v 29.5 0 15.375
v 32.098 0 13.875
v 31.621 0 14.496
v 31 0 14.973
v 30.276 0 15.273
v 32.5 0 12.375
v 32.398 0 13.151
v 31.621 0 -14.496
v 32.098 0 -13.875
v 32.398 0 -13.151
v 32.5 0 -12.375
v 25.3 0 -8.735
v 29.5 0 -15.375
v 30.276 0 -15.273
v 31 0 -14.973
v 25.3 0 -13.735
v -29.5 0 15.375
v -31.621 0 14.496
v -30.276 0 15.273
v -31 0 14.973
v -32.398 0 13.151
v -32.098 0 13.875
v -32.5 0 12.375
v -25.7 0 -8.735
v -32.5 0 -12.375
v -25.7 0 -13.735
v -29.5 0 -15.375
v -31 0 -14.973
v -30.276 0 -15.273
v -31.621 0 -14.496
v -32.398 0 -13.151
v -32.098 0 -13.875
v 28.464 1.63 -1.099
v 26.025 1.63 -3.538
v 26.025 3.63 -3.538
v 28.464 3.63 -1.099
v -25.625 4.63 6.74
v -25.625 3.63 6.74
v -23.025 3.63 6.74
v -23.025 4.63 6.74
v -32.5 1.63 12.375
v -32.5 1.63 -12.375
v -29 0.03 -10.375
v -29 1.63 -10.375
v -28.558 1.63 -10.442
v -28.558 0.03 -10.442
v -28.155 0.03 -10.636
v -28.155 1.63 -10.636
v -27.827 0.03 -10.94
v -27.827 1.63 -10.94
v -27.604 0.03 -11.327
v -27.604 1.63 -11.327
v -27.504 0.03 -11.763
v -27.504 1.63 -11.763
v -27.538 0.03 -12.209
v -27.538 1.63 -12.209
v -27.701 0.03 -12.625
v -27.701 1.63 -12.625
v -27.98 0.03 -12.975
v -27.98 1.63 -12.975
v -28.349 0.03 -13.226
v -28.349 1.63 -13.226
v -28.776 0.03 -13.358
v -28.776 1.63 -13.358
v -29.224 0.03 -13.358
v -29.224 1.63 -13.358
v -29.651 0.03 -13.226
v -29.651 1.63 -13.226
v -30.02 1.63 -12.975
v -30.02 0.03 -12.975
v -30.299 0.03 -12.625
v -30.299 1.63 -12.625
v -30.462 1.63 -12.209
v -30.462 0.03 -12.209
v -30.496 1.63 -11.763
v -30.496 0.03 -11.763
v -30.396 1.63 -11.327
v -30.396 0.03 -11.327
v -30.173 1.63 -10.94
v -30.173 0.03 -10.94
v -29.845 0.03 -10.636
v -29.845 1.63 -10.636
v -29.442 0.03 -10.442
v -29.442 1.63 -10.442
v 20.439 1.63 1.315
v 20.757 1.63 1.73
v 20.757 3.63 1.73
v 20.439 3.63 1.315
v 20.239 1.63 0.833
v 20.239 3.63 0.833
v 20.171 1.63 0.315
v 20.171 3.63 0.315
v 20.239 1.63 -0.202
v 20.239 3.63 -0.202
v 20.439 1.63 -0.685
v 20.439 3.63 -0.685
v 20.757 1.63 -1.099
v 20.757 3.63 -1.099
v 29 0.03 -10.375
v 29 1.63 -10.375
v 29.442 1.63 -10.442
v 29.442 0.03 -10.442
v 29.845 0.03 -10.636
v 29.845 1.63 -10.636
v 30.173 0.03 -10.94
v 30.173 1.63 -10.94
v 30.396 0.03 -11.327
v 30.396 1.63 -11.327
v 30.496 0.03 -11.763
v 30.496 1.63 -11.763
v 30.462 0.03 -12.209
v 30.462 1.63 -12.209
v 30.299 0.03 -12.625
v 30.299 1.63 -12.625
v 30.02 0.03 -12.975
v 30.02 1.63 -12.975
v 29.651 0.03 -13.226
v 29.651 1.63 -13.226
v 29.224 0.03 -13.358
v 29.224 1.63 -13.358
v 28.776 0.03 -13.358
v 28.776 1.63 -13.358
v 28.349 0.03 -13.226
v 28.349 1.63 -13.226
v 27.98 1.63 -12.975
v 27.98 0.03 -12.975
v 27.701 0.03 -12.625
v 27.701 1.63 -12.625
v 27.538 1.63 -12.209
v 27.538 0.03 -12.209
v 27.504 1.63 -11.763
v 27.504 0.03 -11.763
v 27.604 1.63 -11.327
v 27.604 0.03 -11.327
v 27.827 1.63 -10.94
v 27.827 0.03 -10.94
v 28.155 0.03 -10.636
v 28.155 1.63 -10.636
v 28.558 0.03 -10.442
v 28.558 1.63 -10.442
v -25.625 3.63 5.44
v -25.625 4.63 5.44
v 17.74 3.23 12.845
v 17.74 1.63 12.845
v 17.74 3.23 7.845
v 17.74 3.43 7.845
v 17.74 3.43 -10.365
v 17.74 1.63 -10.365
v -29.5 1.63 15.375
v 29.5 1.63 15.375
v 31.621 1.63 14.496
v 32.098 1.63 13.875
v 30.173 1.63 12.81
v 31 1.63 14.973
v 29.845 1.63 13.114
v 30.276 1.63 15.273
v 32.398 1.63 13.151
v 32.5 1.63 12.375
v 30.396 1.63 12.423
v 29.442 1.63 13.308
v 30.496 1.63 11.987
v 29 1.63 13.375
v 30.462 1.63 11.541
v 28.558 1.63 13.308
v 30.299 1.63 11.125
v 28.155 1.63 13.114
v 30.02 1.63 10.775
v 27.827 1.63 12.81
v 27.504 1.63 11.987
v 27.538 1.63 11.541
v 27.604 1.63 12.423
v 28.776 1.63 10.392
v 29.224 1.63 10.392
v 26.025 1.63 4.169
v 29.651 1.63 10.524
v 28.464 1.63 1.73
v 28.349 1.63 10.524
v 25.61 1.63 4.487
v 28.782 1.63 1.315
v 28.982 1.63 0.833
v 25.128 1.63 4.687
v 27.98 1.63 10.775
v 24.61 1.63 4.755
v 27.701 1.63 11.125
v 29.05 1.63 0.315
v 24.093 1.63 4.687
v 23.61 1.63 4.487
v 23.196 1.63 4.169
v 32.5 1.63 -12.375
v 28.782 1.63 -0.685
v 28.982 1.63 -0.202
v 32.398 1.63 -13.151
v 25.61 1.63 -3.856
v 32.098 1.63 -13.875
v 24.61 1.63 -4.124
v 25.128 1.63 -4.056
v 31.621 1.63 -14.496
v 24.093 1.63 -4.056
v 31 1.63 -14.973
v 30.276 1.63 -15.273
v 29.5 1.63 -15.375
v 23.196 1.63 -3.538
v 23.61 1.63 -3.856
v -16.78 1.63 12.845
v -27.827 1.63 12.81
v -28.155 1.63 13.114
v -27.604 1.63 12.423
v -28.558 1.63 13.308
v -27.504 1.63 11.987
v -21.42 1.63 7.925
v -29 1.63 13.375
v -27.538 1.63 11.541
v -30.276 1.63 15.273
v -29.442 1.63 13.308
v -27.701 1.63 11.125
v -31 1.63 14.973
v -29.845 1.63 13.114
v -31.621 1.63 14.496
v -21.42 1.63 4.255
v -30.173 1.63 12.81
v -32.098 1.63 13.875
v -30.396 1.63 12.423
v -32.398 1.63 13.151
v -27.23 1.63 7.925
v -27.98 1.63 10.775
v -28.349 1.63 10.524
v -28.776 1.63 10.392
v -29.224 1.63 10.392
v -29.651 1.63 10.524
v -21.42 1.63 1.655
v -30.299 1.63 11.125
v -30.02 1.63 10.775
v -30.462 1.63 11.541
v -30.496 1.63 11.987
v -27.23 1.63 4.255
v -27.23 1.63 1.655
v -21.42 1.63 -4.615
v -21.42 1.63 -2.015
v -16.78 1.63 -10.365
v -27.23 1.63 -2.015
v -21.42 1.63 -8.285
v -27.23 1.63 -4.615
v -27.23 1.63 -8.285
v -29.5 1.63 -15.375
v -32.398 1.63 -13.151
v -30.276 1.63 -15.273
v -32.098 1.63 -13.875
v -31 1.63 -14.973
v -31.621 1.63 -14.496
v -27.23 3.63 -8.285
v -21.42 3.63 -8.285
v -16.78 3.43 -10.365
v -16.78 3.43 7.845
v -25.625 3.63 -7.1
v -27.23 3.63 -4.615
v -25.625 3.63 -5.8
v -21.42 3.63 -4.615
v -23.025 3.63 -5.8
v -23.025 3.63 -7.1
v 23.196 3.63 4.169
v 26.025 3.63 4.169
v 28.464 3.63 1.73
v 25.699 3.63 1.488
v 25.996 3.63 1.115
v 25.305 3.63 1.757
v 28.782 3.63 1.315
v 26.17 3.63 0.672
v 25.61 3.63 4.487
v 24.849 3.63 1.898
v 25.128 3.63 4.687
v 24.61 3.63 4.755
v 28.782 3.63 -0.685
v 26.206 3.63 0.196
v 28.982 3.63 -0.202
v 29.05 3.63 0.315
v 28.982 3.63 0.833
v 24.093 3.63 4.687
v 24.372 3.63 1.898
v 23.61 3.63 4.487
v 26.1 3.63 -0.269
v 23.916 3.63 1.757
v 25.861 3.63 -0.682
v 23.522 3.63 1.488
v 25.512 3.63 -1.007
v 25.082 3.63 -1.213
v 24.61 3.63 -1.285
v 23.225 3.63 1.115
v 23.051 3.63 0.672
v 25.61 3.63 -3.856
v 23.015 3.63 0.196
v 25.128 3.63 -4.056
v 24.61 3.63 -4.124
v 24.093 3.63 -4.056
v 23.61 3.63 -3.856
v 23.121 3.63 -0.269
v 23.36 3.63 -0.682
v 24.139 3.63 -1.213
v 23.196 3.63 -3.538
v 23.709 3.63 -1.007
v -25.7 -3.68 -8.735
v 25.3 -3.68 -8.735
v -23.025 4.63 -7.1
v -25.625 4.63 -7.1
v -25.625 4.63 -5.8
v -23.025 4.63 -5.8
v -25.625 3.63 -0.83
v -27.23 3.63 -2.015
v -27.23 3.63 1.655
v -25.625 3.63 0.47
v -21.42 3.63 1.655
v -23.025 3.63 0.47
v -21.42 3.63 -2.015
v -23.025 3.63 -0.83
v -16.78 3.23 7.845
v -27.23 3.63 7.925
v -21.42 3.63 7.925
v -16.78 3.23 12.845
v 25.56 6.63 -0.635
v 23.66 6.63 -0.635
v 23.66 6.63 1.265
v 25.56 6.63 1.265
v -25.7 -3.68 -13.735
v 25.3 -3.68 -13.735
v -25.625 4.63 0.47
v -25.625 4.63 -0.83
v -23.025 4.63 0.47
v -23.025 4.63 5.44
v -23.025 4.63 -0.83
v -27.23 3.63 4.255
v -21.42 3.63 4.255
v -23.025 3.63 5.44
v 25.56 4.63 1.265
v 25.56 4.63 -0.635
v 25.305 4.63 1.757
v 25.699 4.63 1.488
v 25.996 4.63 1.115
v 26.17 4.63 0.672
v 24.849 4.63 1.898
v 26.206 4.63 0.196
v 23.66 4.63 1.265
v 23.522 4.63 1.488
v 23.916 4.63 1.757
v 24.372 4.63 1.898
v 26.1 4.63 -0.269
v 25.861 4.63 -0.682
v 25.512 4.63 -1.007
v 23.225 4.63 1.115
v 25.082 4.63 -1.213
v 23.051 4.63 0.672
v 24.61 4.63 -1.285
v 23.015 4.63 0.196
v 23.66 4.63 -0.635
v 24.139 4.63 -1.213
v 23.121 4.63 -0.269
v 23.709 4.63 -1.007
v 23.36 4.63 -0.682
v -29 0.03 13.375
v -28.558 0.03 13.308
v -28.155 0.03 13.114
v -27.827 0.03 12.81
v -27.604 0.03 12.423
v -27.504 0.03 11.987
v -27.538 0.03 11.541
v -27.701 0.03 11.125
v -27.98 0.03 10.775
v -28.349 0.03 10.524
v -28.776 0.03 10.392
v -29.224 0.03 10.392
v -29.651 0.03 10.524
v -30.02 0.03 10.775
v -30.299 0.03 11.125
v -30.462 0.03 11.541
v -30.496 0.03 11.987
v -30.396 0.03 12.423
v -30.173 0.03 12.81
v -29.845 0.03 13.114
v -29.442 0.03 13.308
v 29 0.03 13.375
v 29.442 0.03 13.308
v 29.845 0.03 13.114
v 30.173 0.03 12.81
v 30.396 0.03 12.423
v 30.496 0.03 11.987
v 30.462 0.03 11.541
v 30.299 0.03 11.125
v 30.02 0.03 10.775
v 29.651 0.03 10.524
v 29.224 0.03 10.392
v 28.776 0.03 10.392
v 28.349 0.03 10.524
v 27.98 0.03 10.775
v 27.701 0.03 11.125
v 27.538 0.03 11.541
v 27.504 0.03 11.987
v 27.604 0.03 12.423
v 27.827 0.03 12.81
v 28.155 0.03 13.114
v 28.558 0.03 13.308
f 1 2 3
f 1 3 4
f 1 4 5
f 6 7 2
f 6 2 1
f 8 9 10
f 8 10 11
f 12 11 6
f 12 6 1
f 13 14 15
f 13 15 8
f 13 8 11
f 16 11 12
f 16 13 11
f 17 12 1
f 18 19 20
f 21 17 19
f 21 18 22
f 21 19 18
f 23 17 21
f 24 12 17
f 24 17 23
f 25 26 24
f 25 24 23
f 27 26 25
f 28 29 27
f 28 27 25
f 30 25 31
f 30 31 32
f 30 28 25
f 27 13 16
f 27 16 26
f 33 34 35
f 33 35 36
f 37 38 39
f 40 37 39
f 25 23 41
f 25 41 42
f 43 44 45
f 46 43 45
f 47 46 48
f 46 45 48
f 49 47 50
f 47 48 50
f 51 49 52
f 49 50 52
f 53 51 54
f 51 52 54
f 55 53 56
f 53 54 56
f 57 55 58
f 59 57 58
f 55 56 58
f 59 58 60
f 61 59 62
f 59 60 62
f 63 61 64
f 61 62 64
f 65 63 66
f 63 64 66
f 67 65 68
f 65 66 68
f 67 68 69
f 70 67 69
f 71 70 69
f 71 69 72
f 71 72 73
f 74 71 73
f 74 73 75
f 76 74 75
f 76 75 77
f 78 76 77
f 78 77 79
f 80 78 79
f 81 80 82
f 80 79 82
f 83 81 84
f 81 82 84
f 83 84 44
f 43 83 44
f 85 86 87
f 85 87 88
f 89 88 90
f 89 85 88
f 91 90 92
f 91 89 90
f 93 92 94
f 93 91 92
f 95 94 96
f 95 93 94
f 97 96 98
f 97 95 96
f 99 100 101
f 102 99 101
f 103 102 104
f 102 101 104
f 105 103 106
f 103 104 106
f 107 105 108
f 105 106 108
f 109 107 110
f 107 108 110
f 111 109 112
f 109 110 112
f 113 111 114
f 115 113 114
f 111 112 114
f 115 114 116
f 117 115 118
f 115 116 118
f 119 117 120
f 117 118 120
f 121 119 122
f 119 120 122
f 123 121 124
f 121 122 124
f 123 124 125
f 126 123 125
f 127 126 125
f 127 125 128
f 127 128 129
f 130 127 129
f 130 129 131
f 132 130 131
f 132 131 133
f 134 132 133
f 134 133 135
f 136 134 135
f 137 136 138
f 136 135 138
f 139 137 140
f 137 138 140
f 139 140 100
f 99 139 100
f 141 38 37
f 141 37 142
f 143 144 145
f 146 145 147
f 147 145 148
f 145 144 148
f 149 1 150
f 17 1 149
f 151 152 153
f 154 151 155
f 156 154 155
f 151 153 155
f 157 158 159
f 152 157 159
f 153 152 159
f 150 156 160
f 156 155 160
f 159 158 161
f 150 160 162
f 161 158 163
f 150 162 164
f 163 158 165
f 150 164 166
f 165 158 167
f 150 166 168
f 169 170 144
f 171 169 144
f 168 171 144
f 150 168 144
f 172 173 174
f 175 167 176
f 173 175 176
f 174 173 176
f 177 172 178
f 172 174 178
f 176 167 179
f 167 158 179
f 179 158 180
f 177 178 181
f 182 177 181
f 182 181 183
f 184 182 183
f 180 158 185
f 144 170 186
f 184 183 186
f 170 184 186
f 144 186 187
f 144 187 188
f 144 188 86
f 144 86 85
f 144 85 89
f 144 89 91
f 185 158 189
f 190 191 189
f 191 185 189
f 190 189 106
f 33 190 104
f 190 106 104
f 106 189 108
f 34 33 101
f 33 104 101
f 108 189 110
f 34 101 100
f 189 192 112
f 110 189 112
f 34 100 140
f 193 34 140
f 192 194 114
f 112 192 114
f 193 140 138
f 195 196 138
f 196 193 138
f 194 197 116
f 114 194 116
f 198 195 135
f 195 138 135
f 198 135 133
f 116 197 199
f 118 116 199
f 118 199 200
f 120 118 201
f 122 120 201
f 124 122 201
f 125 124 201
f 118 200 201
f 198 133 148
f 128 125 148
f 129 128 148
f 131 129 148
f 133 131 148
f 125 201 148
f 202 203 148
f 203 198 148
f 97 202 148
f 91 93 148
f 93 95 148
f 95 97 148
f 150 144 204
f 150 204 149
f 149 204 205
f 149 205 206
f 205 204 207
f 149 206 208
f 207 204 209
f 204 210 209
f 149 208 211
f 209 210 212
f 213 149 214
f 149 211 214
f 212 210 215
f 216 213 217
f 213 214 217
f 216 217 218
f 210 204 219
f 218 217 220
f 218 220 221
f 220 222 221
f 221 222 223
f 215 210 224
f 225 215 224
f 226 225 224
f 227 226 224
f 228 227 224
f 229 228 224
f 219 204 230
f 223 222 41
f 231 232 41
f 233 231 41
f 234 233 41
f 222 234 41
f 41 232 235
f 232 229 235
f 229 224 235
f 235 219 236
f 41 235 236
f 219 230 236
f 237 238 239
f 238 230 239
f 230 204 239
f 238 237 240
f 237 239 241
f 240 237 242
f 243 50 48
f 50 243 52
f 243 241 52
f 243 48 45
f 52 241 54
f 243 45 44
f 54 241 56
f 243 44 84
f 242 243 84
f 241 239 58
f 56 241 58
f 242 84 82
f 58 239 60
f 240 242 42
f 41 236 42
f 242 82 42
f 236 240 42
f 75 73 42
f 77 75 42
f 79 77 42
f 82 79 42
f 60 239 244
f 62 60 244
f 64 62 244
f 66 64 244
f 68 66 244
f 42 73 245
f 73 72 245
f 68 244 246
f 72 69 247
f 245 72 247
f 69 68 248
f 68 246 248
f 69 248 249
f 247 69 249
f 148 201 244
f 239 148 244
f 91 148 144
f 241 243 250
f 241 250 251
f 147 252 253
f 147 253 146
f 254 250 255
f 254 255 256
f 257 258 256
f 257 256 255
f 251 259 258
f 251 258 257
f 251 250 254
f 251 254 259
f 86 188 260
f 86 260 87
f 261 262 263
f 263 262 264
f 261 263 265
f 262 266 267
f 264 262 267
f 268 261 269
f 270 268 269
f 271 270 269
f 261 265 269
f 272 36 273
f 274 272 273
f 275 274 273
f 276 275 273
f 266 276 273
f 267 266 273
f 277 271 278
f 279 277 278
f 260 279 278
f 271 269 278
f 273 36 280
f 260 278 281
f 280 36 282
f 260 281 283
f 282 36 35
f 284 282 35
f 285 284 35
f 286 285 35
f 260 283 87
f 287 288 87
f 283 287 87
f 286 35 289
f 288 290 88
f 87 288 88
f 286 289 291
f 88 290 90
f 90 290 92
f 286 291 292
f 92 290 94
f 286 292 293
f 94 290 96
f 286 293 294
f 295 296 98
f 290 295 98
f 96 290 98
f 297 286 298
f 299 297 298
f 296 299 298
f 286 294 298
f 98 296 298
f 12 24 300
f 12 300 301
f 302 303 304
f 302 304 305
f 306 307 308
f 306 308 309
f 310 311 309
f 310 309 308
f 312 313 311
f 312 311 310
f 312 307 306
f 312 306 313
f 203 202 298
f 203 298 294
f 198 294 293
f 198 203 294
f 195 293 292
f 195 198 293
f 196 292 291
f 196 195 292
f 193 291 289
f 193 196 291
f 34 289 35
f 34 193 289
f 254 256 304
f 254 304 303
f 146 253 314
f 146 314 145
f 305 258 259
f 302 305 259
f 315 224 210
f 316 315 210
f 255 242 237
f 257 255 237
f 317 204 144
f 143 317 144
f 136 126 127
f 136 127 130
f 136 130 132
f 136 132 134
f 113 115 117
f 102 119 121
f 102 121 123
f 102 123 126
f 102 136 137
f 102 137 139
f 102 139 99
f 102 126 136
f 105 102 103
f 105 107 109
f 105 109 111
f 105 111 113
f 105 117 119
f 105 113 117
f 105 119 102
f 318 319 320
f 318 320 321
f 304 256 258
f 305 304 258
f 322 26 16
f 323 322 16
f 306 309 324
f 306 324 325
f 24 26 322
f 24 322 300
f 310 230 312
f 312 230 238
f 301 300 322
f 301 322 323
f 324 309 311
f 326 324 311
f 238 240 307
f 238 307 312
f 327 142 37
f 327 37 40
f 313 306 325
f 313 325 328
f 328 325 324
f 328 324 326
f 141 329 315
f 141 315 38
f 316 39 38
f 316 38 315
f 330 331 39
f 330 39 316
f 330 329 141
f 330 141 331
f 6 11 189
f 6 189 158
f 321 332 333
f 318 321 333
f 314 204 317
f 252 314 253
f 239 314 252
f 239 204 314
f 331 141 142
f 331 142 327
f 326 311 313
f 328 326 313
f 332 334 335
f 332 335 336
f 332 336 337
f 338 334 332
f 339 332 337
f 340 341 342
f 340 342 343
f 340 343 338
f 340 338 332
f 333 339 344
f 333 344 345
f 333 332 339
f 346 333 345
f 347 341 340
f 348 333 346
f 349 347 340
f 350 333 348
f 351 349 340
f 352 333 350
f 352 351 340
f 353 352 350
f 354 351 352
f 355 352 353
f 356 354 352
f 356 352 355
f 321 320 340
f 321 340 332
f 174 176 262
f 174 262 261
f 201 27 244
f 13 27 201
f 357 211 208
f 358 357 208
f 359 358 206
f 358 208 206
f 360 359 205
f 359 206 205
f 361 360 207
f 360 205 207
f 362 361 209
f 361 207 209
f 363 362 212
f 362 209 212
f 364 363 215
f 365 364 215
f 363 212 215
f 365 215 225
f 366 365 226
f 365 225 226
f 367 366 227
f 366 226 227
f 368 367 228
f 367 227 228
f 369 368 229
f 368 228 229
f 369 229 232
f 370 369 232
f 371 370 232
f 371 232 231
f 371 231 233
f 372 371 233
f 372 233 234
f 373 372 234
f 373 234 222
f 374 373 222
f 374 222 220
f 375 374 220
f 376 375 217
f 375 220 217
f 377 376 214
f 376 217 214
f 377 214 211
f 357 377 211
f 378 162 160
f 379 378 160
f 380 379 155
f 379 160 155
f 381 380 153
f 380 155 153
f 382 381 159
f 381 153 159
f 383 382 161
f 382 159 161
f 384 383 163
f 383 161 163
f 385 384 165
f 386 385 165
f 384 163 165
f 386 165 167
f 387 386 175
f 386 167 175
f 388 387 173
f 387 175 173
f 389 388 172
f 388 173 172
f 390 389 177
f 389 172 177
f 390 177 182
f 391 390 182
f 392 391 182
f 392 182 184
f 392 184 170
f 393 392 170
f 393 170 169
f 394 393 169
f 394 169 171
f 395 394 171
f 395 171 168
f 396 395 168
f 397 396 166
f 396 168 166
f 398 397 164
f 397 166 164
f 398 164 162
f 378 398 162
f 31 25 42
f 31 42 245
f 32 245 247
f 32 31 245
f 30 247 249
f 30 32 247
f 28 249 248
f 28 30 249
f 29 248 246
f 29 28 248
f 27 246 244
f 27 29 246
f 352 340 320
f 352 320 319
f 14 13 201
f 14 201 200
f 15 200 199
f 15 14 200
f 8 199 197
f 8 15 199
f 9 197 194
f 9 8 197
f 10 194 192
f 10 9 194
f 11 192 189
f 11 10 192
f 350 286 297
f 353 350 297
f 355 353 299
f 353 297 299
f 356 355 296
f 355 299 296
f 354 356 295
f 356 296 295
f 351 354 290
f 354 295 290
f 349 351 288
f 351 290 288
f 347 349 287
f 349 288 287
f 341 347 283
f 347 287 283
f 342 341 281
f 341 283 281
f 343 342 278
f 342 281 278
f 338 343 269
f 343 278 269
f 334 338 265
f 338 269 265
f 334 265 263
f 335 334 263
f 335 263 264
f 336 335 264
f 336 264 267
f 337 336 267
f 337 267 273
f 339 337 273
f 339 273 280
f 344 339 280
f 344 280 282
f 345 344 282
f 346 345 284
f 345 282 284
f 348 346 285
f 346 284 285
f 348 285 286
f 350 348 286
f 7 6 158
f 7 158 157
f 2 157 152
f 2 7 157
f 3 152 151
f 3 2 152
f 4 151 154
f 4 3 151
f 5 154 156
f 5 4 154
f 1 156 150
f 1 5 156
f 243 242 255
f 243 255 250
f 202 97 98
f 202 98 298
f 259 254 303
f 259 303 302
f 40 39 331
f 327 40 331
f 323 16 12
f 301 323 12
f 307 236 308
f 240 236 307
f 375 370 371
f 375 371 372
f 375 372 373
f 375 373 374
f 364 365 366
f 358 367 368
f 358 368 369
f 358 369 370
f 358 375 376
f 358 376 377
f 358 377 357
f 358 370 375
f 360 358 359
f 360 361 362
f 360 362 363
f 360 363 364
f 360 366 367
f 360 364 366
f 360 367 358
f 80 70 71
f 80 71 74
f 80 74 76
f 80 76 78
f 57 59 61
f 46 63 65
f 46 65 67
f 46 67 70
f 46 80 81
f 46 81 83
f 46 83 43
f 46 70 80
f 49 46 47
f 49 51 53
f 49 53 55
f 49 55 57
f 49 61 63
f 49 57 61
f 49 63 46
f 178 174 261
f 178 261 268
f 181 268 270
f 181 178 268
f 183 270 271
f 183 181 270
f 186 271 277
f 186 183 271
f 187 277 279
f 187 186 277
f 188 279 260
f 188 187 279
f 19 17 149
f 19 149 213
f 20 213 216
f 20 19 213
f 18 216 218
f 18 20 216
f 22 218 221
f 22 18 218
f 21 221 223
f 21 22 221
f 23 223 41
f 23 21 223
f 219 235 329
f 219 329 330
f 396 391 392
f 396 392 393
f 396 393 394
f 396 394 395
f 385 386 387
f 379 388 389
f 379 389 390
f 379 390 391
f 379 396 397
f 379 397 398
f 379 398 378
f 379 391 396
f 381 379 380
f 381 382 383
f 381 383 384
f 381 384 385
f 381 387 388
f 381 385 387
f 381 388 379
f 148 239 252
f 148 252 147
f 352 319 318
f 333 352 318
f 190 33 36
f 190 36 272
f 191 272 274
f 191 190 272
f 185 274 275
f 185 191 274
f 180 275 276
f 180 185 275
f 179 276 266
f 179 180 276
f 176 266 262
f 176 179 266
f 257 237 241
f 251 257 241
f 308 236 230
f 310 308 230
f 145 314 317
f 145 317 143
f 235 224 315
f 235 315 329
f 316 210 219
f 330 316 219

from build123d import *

# Parameters (mm, degrees)
EXTRUDE_1_DEPTH     = 1.63
SKETCH_2_R          = 1.5
CUT_EXTRUDE_1_DEPTH = 1.6
SKETCH_3_W          = 34.52
SKETCH_3_H          = 23.21
EXTRUDE_2_DEPTH     = 1.8
EXTRUDE_3_DEPTH     = 2
SKETCH_4_W          = 5.81
SKETCH_4_H          = 3.67
EXTRUDE_4_DEPTH     = 2
SKETCH_7_W          = 2.6
SKETCH_7_H          = 1.3
EXTRUDE_5_DEPTH     = 1
SKETCH_8_W          = 51
SKETCH_8_H          = 5
EXTRUDE_6_DEPTH     = 3.68
SKETCH_9_W          = 1.9
SKETCH_9_H          = 1.9
EXTRUDE_7_DEPTH     = 3
SKETCH_10_R         = 1.6
EXTRUDE_8_DEPTH     = 1
SKETCH_11_W         = 34.52
SKETCH_11_H         = 5
CUT_EXTRUDE_2_DEPTH = 0.2


with BuildPart() as part:
    # 草图1 → 凸台-拉伸1 (new body)
    with BuildSketch(Plane(origin=(0, 0, 0), x_dir=(1, 0, 0), z_dir=(0, 1, 0))):
        with BuildLine():
            Line((-29.5, 15.375), (29.5, 15.375))
            ThreePointArc((29.5, 15.375), (31.621320344, 14.496320344), (32.5, 12.375))
            Line((32.5, 12.375), (32.5, -12.375))
            ThreePointArc((32.5, -12.375), (31.621320344, -14.496320344), (29.5, -15.375))
            Line((29.5, -15.375), (-29.5, -15.375))
            ThreePointArc((-29.5, -15.375), (-31.621320344, -14.496320344), (-32.5, -12.375))
            Line((-32.5, -12.375), (-32.5, 12.375))
            ThreePointArc((-32.5, 12.375), (-31.621320344, 14.496320344), (-29.5, 15.375))
        make_face()
    extrude(amount=EXTRUDE_1_DEPTH)

    # 草图2 → 切除-拉伸1 (cut)
    with BuildSketch(Plane(origin=(0, 1.63, 0), x_dir=(1, 0, 0), z_dir=(0, 1, 0))):
        with Locations(Location((-29, 11.875, 0), (0, 0, 270))):  # turned: the seam where the file's is
            Circle(SKETCH_2_R)
        with Locations(Location((-29, -11.875, 0), (0, 0, 270))):  # turned: the seam where the file's is
            Circle(SKETCH_2_R)
        with Locations(Location((29, -11.875, 0), (0, 0, 270))):  # turned: the seam where the file's is
            Circle(SKETCH_2_R)
        with Locations(Location((29, 11.875, 0), (0, 0, 270))):  # turned: the seam where the file's is
            Circle(SKETCH_2_R)
    extrude(amount=-CUT_EXTRUDE_1_DEPTH, mode=Mode.SUBTRACT)

    # 草图3 → 凸台-拉伸2 (add)
    with BuildSketch(Plane(origin=(0, 1.63, 0), x_dir=(1, 0, 0), z_dir=(0, 1, 0))):
        with Locations((0.48, -1.24)):
            Rectangle(SKETCH_3_W, SKETCH_3_H)
    extrude(amount=EXTRUDE_2_DEPTH)

    # 草图5 → 凸台-拉伸3 (add)
    with BuildSketch(Plane(origin=(0, 1.63, 0), x_dir=(1, 0, 0), z_dir=(0, 1, 0))):
        with BuildLine():
            Line((26.024695167, 3.538250353), (28.464213562, 1.098731957))
            ThreePointArc((28.464213562, 1.098731957), (29.05, -0.315481605), (28.464213562, -1.729695167))
            Line((28.464213562, -1.729695167), (26.024695167, -4.169213562))
            ThreePointArc((26.024695167, -4.169213562), (24.610481605, -4.755), (23.196268043, -4.169213562))
            Line((23.196268043, -4.169213562), (20.756749647, -1.729695167))
            ThreePointArc((20.756749647, -1.729695167), (20.17096321, -0.315481605), (20.756749647, 1.098731957))
            Line((20.756749647, 1.098731957), (23.196268043, 3.538250353))
            ThreePointArc((23.196268043, 3.538250353), (24.610481605, 4.12403679), (26.024695167, 3.538250353))
        make_face()
    extrude(amount=EXTRUDE_3_DEPTH)

    # 草图4 → 凸台-拉伸4 (add)
    with BuildSketch(Plane(origin=(0, 1.63, 0), x_dir=(1, 0, 0), z_dir=(0, 1, 0))):
        with Locations((-24.325, 6.45)):
            Rectangle(SKETCH_4_W, SKETCH_4_H)
        with Locations((-24.325, 0.18)):
            Rectangle(SKETCH_4_W, SKETCH_4_H)
        with Locations((-24.325, -6.09)):
            Rectangle(SKETCH_4_W, SKETCH_4_H)
    extrude(amount=EXTRUDE_4_DEPTH)

    # 草图7 → 凸台-拉伸5 (add)
    with BuildSketch(Plane(origin=(0, 3.63, 0), x_dir=(1, 0, 0), z_dir=(0, 1, 0))):
        with Locations((-24.325, 6.45)):
            Rectangle(SKETCH_7_W, SKETCH_7_H)
        with Locations((-24.325, 0.18)):
            Rectangle(SKETCH_7_W, SKETCH_7_H)
        with Locations((-24.325, -6.09)):
            Rectangle(SKETCH_7_W, SKETCH_7_H)
    extrude(amount=EXTRUDE_5_DEPTH)

    # 草图8 → 凸台-拉伸6 (add)
    with BuildSketch(Plane.XZ):
        with Locations((-0.2, -11.235)):
            Rectangle(SKETCH_8_W, SKETCH_8_H)
    extrude(amount=EXTRUDE_6_DEPTH)

    # 草图9 → 凸台-拉伸7 (add)
    with BuildSketch(Plane(origin=(0, 3.63, 0), x_dir=(1, 0, 0), z_dir=(0, 1, 0))):
        with Locations((24.610481605, -0.315481605)):
            Rectangle(SKETCH_9_W, SKETCH_9_H)
    extrude(amount=EXTRUDE_7_DEPTH)

    # 草图10 → 凸台-拉伸8 (add)
    with BuildSketch(Plane(origin=(0, 3.63, 0), x_dir=(1, 0, 0), z_dir=(0, 1, 0))):
        with Locations(Location((24.610481605, -0.315481605, 0), (0, 0, 90))):  # turned: the seam where the file's is
            Circle(SKETCH_10_R)
    extrude(amount=EXTRUDE_8_DEPTH)

    # 草图11 → 切除-拉伸2 (cut)
    with BuildSketch(Plane(origin=(0, 3.43, 0), x_dir=(1, 0, 0), z_dir=(0, 1, 0))):
        with Locations((0.48, -10.345)):
            Rectangle(SKETCH_11_W, SKETCH_11_H)
    extrude(amount=-CUT_EXTRUDE_2_DEPTH, mode=Mode.SUBTRACT)


solid = part.part
